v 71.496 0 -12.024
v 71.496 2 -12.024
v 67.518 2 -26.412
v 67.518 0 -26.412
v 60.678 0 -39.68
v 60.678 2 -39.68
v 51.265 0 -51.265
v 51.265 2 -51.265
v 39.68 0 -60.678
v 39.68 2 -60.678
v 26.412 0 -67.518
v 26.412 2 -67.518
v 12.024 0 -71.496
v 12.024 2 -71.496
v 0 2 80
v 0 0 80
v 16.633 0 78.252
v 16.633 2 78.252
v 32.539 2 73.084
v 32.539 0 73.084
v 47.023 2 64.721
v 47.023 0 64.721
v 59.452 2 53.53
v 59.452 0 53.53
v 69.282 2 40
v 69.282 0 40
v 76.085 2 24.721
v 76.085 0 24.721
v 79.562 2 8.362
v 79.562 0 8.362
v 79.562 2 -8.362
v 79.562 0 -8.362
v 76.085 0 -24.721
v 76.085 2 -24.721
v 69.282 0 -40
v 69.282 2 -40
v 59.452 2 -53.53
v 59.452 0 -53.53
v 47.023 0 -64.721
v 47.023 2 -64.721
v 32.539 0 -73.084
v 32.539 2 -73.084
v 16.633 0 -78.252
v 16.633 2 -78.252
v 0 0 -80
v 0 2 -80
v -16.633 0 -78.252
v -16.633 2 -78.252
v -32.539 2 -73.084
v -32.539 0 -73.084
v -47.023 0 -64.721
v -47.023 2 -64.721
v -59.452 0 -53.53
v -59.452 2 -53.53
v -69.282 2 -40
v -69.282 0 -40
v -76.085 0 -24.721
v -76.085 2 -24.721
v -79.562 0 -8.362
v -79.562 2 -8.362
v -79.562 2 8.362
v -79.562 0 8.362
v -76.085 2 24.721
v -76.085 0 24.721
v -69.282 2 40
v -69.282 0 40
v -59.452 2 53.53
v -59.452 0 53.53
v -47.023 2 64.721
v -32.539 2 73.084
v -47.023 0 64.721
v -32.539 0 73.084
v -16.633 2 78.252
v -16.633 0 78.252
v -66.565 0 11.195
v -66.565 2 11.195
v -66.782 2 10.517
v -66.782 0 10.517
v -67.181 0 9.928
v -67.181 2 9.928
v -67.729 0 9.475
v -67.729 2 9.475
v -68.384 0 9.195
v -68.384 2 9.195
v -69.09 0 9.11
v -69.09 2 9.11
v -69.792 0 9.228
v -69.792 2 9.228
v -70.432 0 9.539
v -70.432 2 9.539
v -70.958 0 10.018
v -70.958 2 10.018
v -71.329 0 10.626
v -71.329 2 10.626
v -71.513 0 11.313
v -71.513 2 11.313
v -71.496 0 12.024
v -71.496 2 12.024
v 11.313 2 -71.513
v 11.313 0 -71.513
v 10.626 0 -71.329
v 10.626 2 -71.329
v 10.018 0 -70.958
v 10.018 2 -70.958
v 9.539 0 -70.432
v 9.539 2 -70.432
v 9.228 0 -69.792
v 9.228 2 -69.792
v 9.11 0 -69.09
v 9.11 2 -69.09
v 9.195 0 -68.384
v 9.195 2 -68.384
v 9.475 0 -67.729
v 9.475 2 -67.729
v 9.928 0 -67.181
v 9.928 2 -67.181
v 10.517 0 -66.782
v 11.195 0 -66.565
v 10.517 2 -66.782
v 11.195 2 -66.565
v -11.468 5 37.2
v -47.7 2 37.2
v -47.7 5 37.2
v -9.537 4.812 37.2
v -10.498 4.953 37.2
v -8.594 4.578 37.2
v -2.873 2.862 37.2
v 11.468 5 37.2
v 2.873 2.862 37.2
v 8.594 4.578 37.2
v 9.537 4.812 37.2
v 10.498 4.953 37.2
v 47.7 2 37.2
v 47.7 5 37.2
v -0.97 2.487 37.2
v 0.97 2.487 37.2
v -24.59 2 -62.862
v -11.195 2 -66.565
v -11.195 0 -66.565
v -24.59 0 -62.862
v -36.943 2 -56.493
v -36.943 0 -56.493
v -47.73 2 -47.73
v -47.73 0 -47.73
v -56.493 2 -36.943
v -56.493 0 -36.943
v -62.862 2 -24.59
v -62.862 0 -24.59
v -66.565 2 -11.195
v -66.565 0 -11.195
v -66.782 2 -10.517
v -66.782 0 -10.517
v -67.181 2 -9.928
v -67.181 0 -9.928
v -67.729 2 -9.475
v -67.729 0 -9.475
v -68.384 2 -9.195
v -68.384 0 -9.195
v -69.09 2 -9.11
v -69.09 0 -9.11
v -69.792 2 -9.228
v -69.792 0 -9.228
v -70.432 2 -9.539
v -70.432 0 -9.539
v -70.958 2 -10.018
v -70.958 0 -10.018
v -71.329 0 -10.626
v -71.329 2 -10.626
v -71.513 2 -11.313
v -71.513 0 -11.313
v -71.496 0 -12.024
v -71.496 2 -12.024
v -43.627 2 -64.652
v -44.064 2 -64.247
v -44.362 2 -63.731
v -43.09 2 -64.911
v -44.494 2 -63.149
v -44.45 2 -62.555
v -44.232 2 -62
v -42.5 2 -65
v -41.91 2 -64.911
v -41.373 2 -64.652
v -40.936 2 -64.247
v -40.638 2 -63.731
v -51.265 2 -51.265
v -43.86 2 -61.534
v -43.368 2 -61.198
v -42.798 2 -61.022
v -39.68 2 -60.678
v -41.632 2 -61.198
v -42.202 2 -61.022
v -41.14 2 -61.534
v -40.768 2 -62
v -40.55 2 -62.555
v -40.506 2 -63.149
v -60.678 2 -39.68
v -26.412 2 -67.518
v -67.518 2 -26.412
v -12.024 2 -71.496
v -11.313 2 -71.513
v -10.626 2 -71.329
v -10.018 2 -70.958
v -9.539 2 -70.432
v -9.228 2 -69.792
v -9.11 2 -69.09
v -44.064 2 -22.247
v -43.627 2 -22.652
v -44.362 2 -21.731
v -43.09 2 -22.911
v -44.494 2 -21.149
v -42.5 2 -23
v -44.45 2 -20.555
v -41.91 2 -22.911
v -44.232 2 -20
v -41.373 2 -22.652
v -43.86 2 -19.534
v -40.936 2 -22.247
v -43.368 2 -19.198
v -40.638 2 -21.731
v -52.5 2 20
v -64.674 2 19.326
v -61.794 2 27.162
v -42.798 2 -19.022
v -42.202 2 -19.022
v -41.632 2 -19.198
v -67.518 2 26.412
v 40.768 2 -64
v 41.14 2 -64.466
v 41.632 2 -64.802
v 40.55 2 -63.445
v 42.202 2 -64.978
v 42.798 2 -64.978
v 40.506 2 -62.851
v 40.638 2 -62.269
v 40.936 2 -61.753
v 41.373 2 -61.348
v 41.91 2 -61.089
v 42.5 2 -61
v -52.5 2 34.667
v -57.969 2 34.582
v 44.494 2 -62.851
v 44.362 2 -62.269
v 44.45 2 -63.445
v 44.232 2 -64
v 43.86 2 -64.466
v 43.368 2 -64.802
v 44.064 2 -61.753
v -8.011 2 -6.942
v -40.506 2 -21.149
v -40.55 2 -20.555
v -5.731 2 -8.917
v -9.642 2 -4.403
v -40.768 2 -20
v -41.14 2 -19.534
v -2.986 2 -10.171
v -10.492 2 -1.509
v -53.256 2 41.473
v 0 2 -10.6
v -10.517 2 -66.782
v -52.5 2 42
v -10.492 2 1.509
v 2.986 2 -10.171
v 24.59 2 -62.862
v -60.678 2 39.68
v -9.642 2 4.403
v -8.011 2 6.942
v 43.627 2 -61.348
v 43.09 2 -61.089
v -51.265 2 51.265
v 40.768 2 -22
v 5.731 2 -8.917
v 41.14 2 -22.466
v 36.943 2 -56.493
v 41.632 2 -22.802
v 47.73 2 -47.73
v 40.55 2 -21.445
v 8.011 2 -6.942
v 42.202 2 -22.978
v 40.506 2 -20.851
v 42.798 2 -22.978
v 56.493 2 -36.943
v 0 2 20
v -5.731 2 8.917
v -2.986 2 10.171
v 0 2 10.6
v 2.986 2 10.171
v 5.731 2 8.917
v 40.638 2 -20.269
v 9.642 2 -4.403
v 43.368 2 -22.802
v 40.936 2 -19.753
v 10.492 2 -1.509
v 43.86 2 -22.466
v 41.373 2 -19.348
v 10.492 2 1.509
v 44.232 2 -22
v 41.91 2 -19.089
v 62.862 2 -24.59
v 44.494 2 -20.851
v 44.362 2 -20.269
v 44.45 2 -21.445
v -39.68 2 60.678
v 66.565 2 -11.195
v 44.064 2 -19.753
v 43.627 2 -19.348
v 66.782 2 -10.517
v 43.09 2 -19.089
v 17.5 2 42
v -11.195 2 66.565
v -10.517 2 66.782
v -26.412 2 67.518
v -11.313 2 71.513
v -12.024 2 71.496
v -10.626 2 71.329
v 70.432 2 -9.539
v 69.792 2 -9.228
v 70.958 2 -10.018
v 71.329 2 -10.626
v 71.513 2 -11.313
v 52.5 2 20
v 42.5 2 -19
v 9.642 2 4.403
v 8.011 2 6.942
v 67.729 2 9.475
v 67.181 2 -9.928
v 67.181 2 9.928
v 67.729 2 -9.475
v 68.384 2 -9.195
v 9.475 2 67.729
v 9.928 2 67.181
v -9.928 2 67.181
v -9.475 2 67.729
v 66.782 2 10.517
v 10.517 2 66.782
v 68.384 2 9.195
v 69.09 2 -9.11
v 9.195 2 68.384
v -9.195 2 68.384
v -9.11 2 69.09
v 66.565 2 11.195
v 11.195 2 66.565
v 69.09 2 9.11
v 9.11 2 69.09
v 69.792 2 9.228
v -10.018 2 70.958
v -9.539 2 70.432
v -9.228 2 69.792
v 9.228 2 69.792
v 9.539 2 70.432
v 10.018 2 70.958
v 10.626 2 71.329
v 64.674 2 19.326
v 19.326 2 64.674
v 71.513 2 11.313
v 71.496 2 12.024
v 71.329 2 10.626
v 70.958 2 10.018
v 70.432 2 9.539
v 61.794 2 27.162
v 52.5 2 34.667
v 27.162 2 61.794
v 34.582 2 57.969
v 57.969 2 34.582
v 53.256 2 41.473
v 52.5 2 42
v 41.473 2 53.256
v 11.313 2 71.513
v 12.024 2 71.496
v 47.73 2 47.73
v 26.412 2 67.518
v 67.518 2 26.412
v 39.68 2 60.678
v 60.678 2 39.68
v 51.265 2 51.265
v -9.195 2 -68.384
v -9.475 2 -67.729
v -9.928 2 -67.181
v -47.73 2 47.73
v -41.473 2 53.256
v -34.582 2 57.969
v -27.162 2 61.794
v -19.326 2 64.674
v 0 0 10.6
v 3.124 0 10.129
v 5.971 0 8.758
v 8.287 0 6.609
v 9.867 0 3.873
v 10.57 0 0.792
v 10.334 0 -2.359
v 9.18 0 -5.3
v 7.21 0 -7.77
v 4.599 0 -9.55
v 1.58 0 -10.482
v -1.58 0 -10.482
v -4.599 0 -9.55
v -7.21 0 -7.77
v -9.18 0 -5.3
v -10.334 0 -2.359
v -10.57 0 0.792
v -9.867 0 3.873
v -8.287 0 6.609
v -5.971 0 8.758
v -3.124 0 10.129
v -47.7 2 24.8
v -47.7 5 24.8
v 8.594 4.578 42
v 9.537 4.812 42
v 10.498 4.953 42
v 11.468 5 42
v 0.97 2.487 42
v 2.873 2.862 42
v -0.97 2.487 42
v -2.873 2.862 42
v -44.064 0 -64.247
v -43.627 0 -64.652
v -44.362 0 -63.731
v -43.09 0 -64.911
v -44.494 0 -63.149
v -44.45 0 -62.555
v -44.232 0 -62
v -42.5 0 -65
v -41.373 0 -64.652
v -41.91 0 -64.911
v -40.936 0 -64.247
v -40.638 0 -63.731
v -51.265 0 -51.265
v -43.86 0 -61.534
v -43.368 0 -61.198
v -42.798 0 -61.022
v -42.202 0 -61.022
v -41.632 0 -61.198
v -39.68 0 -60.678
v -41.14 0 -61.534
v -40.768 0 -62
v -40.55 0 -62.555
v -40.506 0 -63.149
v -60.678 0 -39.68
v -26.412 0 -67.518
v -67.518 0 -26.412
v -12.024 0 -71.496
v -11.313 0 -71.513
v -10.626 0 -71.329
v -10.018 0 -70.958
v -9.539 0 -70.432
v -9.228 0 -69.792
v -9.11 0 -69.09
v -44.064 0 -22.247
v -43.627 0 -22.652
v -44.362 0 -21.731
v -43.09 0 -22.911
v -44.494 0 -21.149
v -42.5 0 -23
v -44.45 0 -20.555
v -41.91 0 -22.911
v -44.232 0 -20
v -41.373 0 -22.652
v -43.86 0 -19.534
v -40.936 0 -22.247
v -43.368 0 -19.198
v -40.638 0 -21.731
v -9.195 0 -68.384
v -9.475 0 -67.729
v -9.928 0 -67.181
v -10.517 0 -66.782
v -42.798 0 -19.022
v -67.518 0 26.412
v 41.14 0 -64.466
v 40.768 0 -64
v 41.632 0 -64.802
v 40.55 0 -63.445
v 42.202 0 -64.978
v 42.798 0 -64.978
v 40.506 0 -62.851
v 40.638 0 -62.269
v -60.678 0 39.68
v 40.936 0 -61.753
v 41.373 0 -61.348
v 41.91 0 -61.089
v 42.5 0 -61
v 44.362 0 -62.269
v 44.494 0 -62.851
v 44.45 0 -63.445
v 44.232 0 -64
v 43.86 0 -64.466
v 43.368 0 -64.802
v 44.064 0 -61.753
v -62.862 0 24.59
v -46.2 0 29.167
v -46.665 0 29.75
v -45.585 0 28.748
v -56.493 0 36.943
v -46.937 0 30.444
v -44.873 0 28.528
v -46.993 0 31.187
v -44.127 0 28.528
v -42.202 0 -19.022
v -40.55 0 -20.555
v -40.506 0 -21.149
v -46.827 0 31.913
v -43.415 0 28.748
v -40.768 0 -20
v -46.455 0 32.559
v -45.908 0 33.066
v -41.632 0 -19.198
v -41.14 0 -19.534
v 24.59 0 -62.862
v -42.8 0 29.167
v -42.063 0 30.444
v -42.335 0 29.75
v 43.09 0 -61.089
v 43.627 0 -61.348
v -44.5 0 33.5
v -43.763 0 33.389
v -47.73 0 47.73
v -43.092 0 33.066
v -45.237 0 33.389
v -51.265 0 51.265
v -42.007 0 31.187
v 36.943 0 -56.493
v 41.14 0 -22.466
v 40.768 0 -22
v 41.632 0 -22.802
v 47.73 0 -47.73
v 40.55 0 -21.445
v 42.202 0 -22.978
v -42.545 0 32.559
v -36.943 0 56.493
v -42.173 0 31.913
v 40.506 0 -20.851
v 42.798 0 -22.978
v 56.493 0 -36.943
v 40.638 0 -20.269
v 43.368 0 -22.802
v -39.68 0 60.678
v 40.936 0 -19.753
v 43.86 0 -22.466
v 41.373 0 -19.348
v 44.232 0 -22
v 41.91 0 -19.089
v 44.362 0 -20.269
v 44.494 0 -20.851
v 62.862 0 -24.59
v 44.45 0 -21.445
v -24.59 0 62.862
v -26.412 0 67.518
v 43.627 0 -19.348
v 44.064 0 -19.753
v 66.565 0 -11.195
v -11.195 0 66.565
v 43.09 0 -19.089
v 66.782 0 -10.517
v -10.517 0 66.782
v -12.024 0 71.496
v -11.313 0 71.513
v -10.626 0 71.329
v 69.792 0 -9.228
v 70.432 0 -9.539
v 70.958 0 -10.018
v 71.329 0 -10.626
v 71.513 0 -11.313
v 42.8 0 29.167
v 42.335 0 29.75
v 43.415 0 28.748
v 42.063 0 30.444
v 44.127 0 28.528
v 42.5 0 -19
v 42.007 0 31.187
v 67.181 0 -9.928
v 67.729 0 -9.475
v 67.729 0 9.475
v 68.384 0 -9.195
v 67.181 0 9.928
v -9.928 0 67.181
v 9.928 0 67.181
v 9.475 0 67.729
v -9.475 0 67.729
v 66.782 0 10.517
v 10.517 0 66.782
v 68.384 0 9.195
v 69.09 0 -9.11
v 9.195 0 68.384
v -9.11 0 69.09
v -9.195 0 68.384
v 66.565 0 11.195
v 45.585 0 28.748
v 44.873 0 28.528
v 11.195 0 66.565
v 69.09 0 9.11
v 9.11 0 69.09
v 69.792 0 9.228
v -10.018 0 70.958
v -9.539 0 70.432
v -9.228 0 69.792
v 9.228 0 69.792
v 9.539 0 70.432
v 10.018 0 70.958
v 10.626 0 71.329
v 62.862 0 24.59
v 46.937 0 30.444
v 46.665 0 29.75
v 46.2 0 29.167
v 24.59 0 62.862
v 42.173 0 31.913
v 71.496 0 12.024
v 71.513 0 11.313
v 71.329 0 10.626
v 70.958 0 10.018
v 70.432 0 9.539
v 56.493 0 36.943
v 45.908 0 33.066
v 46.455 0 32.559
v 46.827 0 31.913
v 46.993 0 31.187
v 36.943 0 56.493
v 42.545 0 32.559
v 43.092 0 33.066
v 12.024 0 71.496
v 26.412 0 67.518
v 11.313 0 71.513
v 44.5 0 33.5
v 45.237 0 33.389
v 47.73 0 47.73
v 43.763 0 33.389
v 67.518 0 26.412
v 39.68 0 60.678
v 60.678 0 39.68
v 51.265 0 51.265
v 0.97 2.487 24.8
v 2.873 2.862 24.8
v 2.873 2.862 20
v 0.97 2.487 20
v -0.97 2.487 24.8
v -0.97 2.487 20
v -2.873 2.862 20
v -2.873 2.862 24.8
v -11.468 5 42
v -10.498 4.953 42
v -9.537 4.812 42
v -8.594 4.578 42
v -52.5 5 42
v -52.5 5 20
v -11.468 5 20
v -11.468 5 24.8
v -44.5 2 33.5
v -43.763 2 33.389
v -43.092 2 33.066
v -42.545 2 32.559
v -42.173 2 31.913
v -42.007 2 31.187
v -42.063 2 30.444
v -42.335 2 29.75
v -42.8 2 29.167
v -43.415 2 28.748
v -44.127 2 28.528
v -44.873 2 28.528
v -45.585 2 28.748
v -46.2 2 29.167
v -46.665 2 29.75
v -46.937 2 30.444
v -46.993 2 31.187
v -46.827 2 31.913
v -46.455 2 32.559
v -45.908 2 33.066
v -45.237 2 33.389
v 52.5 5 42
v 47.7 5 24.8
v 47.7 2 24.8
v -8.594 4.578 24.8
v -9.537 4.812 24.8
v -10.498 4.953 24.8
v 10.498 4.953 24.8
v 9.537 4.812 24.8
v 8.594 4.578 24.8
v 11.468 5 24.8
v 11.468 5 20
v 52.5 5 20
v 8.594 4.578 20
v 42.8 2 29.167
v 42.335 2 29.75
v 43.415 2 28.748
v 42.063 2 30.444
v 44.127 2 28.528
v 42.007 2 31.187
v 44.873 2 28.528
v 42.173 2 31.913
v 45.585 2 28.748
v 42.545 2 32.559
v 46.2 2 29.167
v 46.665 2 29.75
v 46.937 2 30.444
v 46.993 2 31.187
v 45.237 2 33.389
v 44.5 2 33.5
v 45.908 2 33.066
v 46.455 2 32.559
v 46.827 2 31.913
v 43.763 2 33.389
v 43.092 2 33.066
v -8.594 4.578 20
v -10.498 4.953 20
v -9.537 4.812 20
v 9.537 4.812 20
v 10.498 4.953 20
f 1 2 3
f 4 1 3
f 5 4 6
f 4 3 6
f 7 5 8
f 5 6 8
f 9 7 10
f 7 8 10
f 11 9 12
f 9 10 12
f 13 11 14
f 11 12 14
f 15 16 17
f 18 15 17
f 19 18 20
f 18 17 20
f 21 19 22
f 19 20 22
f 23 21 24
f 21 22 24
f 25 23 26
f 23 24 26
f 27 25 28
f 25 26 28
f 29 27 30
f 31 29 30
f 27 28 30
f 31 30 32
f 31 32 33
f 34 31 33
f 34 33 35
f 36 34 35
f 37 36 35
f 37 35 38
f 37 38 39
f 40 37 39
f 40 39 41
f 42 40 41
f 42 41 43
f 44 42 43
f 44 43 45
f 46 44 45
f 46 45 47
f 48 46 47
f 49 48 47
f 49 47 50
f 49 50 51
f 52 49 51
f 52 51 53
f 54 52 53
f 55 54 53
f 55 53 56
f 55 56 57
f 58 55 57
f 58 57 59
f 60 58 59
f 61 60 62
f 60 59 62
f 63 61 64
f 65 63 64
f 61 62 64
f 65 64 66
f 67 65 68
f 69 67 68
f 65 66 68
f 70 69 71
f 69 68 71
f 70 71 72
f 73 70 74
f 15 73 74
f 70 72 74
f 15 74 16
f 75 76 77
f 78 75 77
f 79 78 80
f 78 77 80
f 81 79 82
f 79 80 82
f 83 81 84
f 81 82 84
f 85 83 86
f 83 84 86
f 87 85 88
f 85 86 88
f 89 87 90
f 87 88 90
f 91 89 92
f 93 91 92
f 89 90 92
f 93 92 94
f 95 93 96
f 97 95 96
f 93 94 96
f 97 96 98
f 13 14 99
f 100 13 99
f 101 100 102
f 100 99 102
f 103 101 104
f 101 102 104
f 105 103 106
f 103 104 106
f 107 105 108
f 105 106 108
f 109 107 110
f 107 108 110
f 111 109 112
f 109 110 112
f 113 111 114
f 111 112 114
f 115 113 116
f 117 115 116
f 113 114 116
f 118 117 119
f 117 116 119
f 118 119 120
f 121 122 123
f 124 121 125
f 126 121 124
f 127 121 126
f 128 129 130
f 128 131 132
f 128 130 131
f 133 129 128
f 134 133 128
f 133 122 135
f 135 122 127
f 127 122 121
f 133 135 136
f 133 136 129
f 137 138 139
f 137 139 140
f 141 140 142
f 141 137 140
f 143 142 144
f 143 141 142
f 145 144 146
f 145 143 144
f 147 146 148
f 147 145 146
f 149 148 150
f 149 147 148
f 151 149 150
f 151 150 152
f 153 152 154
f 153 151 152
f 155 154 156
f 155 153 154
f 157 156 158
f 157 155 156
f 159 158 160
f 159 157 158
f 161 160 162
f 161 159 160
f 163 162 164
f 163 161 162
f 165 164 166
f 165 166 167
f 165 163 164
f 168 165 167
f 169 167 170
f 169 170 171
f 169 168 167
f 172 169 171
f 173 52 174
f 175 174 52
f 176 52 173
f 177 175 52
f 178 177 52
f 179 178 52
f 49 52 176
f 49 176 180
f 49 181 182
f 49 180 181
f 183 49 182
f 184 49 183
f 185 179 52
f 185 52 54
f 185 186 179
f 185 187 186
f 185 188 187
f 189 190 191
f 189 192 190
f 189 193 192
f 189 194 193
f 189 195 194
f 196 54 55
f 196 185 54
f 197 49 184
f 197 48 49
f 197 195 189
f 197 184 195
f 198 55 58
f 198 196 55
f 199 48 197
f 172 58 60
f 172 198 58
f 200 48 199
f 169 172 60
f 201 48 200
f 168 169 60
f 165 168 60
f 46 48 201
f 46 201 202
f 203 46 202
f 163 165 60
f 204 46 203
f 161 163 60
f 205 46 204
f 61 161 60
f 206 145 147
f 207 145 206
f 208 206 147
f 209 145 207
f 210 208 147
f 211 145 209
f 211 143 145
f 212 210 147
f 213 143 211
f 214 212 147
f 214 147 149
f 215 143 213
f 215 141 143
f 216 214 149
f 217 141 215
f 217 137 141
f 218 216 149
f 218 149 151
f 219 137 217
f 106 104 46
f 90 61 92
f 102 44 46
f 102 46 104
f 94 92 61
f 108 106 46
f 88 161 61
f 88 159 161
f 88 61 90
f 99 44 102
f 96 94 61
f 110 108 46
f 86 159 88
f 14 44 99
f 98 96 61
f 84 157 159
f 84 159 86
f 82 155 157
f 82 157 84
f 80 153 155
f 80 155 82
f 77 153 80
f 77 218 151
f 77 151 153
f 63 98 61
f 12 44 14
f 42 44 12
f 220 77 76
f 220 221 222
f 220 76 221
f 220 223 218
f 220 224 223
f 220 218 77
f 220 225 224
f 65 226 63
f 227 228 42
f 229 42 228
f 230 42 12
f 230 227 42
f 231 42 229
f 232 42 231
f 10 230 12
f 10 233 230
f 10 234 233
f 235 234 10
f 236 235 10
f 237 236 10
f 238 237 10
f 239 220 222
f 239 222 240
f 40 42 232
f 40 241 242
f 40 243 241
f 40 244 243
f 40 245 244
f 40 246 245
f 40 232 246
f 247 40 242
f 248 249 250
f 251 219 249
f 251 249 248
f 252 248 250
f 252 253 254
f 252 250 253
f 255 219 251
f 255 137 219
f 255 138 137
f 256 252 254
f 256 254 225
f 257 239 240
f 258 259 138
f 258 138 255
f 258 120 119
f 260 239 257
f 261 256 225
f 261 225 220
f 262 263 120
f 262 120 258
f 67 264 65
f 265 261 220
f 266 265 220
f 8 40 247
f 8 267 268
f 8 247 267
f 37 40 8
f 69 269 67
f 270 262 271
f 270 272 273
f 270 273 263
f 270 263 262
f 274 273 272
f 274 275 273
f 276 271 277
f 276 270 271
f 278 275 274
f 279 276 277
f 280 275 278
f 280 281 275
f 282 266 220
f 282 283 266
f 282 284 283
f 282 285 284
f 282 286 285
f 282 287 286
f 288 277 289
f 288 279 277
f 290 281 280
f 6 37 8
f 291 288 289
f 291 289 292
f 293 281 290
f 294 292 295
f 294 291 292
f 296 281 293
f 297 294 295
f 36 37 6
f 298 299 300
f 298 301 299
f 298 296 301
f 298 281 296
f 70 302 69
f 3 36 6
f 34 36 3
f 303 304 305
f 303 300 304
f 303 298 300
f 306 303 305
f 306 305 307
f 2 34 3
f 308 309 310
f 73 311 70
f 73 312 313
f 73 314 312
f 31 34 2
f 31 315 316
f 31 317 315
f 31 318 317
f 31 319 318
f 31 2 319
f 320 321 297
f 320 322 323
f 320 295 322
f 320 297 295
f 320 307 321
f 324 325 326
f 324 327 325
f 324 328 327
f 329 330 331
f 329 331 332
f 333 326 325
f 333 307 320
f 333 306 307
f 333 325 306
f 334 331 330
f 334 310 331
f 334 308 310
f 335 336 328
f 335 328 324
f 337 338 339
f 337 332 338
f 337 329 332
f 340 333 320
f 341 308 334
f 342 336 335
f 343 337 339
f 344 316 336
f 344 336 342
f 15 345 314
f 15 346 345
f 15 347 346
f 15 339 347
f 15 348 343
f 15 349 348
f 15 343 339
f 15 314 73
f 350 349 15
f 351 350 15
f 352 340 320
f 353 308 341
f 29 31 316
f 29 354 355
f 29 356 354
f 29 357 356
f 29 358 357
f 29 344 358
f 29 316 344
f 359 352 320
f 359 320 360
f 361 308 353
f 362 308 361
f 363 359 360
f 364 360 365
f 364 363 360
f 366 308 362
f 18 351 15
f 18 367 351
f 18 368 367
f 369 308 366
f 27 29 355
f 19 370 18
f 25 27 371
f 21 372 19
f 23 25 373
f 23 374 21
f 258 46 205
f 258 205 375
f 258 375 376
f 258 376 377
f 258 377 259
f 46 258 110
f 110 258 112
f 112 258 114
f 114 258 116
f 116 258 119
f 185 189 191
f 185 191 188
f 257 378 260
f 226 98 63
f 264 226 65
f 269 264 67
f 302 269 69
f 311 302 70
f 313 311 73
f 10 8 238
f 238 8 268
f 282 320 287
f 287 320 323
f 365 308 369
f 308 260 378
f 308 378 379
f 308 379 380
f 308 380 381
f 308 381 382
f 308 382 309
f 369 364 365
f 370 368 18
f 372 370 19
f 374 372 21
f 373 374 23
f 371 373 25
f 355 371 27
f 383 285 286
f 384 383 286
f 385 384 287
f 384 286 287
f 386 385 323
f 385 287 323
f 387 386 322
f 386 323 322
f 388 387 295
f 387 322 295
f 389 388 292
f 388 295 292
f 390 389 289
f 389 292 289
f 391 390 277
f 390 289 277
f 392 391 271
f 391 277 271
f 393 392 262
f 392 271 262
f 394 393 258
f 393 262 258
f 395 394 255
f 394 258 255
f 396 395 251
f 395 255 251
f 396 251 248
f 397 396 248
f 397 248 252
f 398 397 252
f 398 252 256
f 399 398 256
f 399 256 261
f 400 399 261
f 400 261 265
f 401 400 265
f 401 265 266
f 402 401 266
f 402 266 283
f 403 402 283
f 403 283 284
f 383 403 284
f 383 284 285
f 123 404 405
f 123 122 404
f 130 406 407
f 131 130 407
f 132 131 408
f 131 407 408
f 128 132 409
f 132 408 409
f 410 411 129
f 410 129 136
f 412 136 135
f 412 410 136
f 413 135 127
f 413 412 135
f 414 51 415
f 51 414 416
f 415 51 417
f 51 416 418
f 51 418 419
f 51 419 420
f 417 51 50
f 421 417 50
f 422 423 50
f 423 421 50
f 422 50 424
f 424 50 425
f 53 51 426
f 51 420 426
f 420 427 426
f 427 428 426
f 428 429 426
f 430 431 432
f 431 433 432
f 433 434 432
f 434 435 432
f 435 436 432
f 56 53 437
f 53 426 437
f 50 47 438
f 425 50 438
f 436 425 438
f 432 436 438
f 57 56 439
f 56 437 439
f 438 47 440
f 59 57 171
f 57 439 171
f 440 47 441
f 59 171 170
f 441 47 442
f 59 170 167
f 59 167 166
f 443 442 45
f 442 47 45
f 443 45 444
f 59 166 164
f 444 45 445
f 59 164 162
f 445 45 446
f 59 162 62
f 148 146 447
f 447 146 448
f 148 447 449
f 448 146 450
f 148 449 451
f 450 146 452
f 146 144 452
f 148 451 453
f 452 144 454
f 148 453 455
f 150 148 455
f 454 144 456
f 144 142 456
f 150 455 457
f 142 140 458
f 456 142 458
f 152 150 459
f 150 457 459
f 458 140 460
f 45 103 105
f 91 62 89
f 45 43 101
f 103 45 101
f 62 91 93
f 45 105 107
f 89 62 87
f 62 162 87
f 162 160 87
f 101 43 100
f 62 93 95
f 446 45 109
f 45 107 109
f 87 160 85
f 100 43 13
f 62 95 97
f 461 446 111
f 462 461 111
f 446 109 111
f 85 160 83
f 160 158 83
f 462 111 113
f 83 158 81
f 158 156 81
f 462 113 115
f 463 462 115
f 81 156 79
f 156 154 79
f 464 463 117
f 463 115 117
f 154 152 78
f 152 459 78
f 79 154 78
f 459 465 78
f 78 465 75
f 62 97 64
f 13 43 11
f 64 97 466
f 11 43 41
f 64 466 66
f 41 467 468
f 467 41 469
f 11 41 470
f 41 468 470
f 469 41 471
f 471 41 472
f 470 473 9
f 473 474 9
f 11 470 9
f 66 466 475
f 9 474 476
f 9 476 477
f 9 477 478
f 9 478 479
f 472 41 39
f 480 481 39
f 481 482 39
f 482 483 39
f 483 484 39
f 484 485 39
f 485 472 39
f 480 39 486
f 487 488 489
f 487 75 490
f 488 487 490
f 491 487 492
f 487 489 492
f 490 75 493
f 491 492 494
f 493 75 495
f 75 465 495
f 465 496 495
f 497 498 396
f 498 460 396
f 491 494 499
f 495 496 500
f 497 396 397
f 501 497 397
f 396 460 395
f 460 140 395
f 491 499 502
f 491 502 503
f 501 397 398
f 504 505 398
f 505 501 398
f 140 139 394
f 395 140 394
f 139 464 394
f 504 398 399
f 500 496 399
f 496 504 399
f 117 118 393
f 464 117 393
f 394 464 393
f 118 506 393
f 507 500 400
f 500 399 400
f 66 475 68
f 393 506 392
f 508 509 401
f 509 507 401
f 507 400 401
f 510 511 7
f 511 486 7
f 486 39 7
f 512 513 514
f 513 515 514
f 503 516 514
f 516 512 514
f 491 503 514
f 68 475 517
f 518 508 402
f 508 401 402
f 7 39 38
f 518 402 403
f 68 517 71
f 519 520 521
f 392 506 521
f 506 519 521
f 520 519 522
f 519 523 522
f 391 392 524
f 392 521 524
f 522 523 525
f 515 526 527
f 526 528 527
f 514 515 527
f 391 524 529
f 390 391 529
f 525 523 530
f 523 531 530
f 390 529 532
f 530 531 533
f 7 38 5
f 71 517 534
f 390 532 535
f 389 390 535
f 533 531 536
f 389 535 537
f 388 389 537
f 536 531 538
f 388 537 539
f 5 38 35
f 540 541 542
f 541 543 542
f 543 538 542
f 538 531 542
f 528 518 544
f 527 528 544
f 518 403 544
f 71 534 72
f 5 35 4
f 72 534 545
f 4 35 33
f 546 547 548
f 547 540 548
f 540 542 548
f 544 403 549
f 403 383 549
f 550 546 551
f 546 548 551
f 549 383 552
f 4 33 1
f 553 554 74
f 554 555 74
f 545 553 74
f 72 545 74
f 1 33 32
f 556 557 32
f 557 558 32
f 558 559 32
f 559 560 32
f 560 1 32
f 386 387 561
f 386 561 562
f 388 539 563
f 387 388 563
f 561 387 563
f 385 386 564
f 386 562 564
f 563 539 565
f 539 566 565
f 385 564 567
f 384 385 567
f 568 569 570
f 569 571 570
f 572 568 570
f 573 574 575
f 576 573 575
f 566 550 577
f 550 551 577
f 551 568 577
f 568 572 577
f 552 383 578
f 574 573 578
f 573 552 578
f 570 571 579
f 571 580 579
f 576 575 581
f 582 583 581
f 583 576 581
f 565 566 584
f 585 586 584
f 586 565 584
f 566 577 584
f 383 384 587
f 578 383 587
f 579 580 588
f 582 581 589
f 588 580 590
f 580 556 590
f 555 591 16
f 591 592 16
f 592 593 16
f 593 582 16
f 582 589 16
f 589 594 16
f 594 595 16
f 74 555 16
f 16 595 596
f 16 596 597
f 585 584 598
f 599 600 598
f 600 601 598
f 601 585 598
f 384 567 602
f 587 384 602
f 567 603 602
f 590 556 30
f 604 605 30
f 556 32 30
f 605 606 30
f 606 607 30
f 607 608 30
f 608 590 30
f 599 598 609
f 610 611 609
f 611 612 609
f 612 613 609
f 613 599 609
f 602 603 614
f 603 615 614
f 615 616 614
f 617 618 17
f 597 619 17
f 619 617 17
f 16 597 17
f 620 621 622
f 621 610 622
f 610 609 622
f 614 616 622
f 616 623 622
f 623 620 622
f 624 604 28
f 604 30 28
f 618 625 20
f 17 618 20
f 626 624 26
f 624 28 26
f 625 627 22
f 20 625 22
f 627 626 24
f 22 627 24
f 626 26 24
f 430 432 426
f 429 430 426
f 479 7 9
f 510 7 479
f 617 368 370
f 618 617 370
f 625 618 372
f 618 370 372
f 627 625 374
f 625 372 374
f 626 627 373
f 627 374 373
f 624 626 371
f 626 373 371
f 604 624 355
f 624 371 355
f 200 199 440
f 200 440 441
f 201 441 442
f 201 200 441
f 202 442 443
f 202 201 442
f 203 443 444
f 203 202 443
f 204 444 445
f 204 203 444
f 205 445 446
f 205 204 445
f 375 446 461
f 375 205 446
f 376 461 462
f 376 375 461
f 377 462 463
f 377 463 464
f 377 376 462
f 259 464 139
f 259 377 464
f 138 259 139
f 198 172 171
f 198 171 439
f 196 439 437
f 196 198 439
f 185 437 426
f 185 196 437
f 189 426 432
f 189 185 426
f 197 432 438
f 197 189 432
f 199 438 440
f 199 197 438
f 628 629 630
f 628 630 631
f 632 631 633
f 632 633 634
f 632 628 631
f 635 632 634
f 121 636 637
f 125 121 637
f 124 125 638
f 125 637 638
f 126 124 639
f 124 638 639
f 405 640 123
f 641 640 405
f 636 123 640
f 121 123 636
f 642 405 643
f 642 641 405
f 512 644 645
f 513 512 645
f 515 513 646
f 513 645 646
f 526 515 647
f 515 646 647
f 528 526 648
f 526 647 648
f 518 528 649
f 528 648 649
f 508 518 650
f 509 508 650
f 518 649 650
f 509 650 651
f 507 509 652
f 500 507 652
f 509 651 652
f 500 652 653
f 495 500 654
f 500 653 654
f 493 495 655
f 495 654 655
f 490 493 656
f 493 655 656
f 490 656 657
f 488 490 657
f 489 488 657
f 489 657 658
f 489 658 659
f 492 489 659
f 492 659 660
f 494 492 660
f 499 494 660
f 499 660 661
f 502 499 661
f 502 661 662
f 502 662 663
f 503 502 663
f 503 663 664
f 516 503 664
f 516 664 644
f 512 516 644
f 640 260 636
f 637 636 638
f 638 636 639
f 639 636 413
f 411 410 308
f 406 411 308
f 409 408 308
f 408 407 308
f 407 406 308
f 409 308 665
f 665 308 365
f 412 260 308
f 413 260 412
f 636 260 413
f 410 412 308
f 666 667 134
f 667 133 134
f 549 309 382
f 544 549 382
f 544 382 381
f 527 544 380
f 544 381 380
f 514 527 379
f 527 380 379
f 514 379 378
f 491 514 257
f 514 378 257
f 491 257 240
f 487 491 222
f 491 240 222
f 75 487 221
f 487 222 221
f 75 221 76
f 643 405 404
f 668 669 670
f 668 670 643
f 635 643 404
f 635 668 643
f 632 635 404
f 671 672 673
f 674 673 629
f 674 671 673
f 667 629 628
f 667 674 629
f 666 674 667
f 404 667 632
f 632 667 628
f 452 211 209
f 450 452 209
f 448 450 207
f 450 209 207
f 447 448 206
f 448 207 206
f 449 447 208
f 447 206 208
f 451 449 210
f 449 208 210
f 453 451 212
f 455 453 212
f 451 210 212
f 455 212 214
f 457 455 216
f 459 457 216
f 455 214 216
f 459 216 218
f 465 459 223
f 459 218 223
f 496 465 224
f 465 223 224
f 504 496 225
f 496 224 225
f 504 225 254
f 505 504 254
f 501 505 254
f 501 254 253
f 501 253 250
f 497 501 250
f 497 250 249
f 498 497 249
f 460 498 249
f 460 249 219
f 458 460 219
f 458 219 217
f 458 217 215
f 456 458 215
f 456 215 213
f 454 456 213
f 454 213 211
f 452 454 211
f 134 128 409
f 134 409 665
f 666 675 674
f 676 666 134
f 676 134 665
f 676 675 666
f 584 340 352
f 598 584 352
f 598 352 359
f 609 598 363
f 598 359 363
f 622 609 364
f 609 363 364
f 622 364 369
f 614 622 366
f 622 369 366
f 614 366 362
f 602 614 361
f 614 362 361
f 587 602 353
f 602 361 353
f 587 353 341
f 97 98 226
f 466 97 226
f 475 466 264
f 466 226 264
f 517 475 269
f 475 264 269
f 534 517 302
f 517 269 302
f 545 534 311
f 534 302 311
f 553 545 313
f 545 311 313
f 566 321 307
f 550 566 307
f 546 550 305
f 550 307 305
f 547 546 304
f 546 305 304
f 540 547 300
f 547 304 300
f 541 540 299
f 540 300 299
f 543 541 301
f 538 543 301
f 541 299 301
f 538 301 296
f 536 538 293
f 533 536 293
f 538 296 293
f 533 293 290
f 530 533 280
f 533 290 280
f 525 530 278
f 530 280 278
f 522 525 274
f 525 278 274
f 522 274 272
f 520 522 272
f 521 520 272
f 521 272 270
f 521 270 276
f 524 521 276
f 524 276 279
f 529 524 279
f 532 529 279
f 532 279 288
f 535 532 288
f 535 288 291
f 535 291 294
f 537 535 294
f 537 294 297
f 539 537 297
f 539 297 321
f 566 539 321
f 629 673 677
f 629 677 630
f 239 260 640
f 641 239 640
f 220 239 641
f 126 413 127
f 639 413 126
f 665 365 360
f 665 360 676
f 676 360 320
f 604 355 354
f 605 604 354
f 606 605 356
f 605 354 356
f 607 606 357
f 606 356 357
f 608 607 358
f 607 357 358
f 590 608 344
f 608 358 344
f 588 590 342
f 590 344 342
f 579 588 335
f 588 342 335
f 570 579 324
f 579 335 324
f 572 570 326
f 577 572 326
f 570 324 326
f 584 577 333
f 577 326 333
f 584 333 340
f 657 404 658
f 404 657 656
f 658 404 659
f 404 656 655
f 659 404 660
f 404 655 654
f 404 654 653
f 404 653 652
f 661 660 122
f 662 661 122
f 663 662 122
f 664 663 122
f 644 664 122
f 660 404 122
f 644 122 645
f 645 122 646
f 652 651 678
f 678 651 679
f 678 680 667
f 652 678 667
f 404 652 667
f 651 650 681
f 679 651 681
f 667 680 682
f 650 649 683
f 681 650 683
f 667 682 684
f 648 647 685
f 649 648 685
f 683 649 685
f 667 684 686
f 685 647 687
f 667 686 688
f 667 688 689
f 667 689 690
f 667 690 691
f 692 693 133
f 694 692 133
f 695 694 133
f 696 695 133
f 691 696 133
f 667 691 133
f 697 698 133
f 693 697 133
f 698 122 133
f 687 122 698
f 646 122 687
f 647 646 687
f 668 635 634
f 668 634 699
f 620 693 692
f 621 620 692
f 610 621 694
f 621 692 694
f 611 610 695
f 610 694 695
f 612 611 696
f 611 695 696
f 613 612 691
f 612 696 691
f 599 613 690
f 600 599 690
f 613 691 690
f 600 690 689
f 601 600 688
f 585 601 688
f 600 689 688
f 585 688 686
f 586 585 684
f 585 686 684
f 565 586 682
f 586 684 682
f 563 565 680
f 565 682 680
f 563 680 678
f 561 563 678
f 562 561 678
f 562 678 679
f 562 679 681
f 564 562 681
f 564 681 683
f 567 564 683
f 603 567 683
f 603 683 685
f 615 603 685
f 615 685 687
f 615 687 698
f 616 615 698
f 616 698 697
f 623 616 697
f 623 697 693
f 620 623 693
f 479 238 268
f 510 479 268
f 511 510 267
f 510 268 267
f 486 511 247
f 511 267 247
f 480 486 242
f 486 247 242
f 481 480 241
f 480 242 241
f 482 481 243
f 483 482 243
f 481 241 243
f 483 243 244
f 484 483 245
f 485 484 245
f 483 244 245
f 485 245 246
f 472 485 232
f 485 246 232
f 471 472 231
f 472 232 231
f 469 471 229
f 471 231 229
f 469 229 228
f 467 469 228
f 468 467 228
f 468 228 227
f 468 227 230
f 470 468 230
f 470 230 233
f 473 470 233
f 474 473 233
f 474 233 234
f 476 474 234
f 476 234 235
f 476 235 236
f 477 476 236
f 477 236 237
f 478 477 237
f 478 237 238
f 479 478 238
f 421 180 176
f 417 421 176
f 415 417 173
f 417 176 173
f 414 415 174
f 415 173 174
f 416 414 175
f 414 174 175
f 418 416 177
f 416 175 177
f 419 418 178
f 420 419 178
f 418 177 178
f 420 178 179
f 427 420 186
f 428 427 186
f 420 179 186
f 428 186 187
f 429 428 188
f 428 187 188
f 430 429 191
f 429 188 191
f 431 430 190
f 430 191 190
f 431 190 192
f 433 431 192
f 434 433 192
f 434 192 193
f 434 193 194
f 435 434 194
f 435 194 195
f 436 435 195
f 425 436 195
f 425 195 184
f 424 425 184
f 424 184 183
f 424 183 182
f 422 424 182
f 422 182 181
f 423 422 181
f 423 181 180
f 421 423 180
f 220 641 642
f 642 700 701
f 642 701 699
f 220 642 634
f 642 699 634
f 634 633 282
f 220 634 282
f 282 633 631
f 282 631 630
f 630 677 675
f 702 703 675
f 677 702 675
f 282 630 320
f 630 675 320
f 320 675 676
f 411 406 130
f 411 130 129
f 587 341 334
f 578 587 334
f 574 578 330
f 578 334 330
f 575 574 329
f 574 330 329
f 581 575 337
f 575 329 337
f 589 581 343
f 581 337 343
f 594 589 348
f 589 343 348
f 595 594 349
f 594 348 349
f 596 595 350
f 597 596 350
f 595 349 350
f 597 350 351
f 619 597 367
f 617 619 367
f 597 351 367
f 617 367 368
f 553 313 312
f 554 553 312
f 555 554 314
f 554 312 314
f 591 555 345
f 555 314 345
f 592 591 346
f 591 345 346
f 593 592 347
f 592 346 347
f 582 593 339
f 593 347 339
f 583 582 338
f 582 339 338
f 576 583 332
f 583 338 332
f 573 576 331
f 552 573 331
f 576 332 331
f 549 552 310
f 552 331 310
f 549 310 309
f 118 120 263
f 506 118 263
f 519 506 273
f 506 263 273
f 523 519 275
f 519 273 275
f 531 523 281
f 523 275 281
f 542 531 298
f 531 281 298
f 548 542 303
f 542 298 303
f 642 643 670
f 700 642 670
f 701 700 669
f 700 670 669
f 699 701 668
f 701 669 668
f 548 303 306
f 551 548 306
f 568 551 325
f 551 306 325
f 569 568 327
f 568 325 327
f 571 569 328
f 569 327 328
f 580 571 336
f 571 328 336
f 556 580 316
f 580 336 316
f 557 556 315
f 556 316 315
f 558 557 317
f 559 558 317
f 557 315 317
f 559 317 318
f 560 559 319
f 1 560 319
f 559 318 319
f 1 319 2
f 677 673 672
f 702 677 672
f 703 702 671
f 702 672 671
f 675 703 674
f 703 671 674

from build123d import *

# Parameters (mm, degrees)
SKETCH1_R           = 80
BOSS_EXTRUDE1_DEPTH = 2
CUT_EXTRUDE1_DEPTH  = 2
SKETCH3_R           = 2.5000000000000027
CUT_EXTRUDE2_DEPTH  = 114.15476127852509
SKETCH4_W           = 105.00000000000001
SKETCH4_H           = 21.999999999999993
SKETCH4_W_2         = 95
SKETCH4_H_2         = 12
BOSS_EXTRUDE2_DEPTH = 3
CUT_EXTRUDE3_DEPTH  = 146.9760254288354
FILLET1_R           = 10
SKETCH6_R           = 2.0000000000000036
CUT_EXTRUDE4_DEPTH  = 114.17685290111224
MOVE_FACE1_BY       = 0.2
MOVE_FACE1_2_BY     = 0.2
MOVE_FACE1_3_BY     = 0.2
MOVE_FACE1_4_BY     = 0.2
SKETCH7_R           = 10.6
CUT_EXTRUDE5_DEPTH  = 114.17685290111224


with BuildPart() as part:
    # Sketch1 → Boss-Extrude1 (new body)
    with BuildSketch(Plane(origin=(0, 0, 0), x_dir=(1, 0, 0), z_dir=(0, 1, 0))):
        Circle(SKETCH1_R)
    extrude(amount=BOSS_EXTRUDE1_DEPTH)

    # Sketch2 → Cut-Extrude1 (cut)
    with BuildSketch(Plane(origin=(0, 2, 0), x_dir=(1, 0, 0), z_dir=(0, 1, 0))):
        with BuildLine():
            ThreePointArc((-11.194987519973791, 66.5651729842839), (-9.14423991018458, 69.44517892888601), (-12.024245854786658, 71.49592653867526))
            ThreePointArc((-12.024245854786658, 71.49592653867526), (-51.265241636024435, 51.26524163602498), (-71.49592653867512, 12.02424585478741))
            ThreePointArc((-71.49592653867514, 12.024245854787408), (-69.44517892888592, 9.144239910185334), (-66.5651729842838, 11.194987519974491))
            ThreePointArc((-66.56517298428382, 11.194987519974493), (-47.72970773009176, 47.72970773009226), (-11.194987519973797, 66.56517298428392))
        make_face()
        with BuildLine():
            ThreePointArc((12.02424585478666, 71.49592653867526), (9.14423991018458, 69.44517892888601), (11.194987519973791, 66.5651729842839))
            ThreePointArc((11.194987519973797, 66.56517298428392), (47.729707730092095, 47.72970773009193), (66.56517298428396, 11.194987519973562))
            ThreePointArc((66.56517298428395, 11.19498751997356), (69.44517892888604, 9.144239910184341), (71.4959265386753, 12.024245854786408))
            ThreePointArc((71.49592653867529, 12.024245854786408), (51.265241636024804, 51.265241636024626), (12.02424585478666, 71.49592653867526))
        make_face()
        with BuildLine():
            ThreePointArc((71.49592653867522, -12.024245854786907), (69.44517892888598, -9.144239910184819), (66.56517298428386, -11.194987519974026))
            ThreePointArc((66.56517298428388, -11.194987519974019), (47.72970773009176, -47.729707730092265), (11.194987519973328, -66.565172984284))
            ThreePointArc((11.194987519973324, -66.56517298428399), (9.144239910184115, -69.44517892888608), (12.024245854786155, -71.49592653867535))
            ThreePointArc((12.024245854786159, -71.49592653867536), (51.26524163602445, -51.265241636024996), (71.49592653867523, -12.024245854786914))
        make_face()
        with BuildLine():
            ThreePointArc((-12.02424585478716, -71.49592653867518), (-9.144239910185082, -69.44517892888595), (-11.194987519974264, -66.56517298428383))
            ThreePointArc((-11.194987519974267, -66.56517298428385), (-47.72970773009242, -47.72970773009158), (-66.56517298428403, -11.194987519973097))
            ThreePointArc((-66.56517298428402, -11.194987519973095), (-69.4451789288861, -9.144239910183853), (-71.49592653867538, -12.024245854785907))
            ThreePointArc((-71.49592653867539, -12.02424585478591), (-51.26524163602516, -51.26524163602427), (-12.024245854787168, -71.49592653867518))
        make_face()
    extrude(amount=-CUT_EXTRUDE1_DEPTH, mode=Mode.SUBTRACT)

    # Sketch3 → Cut-Extrude2 (cut, through all)
    with BuildSketch(Plane(origin=(0, 2, 0), x_dir=(1, 0, 0), z_dir=(0, 1, 0))):
        with Locations((-44.49999999999999, -31.00000000000001)):
            Circle(SKETCH3_R)
        with Locations((44.50000000000001, -31)):
            Circle(SKETCH3_R)
    extrude(amount=-CUT_EXTRUDE2_DEPTH, mode=Mode.SUBTRACT)

    # Sketch4 → Boss-Extrude2 (add)
    with BuildSketch(Plane(origin=(0, 2, 0), x_dir=(1, 0, 0), z_dir=(0, 1, 0))):
        with Locations((0, -31.000000000000004)):
            Rectangle(SKETCH4_W, SKETCH4_H)
        with Locations((0, -31.000000000000007)):
            Rectangle(SKETCH4_W_2, SKETCH4_H_2, mode=Mode.SUBTRACT)
    extrude(amount=BOSS_EXTRUDE2_DEPTH)

    # Sketch5 → Cut-Extrude3 (cut, through all)
    with BuildSketch(Plane.XY.offset(42)):
        Polygon((3.469e-14, 2), (-10, 5.000000000000003), (10, 5.000000000000008), align=None)
    extrude(amount=-CUT_EXTRUDE3_DEPTH, mode=Mode.SUBTRACT)

    # Fillet1
    fillet1_edges = [part.edges().sort_by_distance(p)[0] for p in [
        (10, 5.000000000000008, 39.5),
        (10, 5.000000000000008, 22.500000000000007),
        (3.469e-14, 2, 22.500000000000007),
        (3.469e-14, 2, 39.5),
        (-10, 5.000000000000003, 39.5),
        (-10, 5.000000000000003, 22.500000000000007),
    ]]
    fillet(fillet1_edges, radius=FILLET1_R)

    # Sketch6 → Cut-Extrude4 (cut, through all)
    with BuildSketch(Plane(origin=(0, 2, 0), x_dir=(1, 0, 0), z_dir=(0, 1, 0))):
        with Locations((42.499999999999986, 63)):
            Circle(SKETCH6_R)
        with Locations((42.49999999999999, 20.999999999999996)):
            Circle(SKETCH6_R)
        with Locations((-42.49999999999999, 20.999999999999996)):
            Circle(SKETCH6_R)
        with Locations((-42.499999999999986, 63)):
            Circle(SKETCH6_R)
    extrude(amount=-CUT_EXTRUDE4_DEPTH, mode=Mode.SUBTRACT)

    # Move Face1: a face moved inward by 0.2
    extrude(part.faces().sort_by_distance((47.5, 3.5, 31))[0], amount=MOVE_FACE1_BY, dir=(1, 0, 0), mode=Mode.SUBTRACT)

    # Move Face1 2: a face moved inward by 0.2
    extrude(part.faces().sort_by_distance((0, 2.3, 37))[0], amount=MOVE_FACE1_2_BY, dir=(0, 0, 1), mode=Mode.SUBTRACT)

    # Move Face1 3: a face moved inward by 0.2
    extrude(part.faces().sort_by_distance((-47.5, 3.5, 31))[0], amount=MOVE_FACE1_3_BY, dir=(-1, 0, 0), mode=Mode.SUBTRACT)

    # Move Face1 4: a face moved inward by 0.2
    extrude(part.faces().sort_by_distance((0, 2.3, 25))[0], amount=MOVE_FACE1_4_BY, dir=(0, 0, -1), mode=Mode.SUBTRACT)

    # Sketch7 → Cut-Extrude5 (cut, through all)
    with BuildSketch(Plane(origin=(0, 2, 0), x_dir=(1, 0, 0), z_dir=(0, 1, 0))):
        Circle(SKETCH7_R)
    extrude(amount=-CUT_EXTRUDE5_DEPTH, mode=Mode.SUBTRACT)


solid = part.part
